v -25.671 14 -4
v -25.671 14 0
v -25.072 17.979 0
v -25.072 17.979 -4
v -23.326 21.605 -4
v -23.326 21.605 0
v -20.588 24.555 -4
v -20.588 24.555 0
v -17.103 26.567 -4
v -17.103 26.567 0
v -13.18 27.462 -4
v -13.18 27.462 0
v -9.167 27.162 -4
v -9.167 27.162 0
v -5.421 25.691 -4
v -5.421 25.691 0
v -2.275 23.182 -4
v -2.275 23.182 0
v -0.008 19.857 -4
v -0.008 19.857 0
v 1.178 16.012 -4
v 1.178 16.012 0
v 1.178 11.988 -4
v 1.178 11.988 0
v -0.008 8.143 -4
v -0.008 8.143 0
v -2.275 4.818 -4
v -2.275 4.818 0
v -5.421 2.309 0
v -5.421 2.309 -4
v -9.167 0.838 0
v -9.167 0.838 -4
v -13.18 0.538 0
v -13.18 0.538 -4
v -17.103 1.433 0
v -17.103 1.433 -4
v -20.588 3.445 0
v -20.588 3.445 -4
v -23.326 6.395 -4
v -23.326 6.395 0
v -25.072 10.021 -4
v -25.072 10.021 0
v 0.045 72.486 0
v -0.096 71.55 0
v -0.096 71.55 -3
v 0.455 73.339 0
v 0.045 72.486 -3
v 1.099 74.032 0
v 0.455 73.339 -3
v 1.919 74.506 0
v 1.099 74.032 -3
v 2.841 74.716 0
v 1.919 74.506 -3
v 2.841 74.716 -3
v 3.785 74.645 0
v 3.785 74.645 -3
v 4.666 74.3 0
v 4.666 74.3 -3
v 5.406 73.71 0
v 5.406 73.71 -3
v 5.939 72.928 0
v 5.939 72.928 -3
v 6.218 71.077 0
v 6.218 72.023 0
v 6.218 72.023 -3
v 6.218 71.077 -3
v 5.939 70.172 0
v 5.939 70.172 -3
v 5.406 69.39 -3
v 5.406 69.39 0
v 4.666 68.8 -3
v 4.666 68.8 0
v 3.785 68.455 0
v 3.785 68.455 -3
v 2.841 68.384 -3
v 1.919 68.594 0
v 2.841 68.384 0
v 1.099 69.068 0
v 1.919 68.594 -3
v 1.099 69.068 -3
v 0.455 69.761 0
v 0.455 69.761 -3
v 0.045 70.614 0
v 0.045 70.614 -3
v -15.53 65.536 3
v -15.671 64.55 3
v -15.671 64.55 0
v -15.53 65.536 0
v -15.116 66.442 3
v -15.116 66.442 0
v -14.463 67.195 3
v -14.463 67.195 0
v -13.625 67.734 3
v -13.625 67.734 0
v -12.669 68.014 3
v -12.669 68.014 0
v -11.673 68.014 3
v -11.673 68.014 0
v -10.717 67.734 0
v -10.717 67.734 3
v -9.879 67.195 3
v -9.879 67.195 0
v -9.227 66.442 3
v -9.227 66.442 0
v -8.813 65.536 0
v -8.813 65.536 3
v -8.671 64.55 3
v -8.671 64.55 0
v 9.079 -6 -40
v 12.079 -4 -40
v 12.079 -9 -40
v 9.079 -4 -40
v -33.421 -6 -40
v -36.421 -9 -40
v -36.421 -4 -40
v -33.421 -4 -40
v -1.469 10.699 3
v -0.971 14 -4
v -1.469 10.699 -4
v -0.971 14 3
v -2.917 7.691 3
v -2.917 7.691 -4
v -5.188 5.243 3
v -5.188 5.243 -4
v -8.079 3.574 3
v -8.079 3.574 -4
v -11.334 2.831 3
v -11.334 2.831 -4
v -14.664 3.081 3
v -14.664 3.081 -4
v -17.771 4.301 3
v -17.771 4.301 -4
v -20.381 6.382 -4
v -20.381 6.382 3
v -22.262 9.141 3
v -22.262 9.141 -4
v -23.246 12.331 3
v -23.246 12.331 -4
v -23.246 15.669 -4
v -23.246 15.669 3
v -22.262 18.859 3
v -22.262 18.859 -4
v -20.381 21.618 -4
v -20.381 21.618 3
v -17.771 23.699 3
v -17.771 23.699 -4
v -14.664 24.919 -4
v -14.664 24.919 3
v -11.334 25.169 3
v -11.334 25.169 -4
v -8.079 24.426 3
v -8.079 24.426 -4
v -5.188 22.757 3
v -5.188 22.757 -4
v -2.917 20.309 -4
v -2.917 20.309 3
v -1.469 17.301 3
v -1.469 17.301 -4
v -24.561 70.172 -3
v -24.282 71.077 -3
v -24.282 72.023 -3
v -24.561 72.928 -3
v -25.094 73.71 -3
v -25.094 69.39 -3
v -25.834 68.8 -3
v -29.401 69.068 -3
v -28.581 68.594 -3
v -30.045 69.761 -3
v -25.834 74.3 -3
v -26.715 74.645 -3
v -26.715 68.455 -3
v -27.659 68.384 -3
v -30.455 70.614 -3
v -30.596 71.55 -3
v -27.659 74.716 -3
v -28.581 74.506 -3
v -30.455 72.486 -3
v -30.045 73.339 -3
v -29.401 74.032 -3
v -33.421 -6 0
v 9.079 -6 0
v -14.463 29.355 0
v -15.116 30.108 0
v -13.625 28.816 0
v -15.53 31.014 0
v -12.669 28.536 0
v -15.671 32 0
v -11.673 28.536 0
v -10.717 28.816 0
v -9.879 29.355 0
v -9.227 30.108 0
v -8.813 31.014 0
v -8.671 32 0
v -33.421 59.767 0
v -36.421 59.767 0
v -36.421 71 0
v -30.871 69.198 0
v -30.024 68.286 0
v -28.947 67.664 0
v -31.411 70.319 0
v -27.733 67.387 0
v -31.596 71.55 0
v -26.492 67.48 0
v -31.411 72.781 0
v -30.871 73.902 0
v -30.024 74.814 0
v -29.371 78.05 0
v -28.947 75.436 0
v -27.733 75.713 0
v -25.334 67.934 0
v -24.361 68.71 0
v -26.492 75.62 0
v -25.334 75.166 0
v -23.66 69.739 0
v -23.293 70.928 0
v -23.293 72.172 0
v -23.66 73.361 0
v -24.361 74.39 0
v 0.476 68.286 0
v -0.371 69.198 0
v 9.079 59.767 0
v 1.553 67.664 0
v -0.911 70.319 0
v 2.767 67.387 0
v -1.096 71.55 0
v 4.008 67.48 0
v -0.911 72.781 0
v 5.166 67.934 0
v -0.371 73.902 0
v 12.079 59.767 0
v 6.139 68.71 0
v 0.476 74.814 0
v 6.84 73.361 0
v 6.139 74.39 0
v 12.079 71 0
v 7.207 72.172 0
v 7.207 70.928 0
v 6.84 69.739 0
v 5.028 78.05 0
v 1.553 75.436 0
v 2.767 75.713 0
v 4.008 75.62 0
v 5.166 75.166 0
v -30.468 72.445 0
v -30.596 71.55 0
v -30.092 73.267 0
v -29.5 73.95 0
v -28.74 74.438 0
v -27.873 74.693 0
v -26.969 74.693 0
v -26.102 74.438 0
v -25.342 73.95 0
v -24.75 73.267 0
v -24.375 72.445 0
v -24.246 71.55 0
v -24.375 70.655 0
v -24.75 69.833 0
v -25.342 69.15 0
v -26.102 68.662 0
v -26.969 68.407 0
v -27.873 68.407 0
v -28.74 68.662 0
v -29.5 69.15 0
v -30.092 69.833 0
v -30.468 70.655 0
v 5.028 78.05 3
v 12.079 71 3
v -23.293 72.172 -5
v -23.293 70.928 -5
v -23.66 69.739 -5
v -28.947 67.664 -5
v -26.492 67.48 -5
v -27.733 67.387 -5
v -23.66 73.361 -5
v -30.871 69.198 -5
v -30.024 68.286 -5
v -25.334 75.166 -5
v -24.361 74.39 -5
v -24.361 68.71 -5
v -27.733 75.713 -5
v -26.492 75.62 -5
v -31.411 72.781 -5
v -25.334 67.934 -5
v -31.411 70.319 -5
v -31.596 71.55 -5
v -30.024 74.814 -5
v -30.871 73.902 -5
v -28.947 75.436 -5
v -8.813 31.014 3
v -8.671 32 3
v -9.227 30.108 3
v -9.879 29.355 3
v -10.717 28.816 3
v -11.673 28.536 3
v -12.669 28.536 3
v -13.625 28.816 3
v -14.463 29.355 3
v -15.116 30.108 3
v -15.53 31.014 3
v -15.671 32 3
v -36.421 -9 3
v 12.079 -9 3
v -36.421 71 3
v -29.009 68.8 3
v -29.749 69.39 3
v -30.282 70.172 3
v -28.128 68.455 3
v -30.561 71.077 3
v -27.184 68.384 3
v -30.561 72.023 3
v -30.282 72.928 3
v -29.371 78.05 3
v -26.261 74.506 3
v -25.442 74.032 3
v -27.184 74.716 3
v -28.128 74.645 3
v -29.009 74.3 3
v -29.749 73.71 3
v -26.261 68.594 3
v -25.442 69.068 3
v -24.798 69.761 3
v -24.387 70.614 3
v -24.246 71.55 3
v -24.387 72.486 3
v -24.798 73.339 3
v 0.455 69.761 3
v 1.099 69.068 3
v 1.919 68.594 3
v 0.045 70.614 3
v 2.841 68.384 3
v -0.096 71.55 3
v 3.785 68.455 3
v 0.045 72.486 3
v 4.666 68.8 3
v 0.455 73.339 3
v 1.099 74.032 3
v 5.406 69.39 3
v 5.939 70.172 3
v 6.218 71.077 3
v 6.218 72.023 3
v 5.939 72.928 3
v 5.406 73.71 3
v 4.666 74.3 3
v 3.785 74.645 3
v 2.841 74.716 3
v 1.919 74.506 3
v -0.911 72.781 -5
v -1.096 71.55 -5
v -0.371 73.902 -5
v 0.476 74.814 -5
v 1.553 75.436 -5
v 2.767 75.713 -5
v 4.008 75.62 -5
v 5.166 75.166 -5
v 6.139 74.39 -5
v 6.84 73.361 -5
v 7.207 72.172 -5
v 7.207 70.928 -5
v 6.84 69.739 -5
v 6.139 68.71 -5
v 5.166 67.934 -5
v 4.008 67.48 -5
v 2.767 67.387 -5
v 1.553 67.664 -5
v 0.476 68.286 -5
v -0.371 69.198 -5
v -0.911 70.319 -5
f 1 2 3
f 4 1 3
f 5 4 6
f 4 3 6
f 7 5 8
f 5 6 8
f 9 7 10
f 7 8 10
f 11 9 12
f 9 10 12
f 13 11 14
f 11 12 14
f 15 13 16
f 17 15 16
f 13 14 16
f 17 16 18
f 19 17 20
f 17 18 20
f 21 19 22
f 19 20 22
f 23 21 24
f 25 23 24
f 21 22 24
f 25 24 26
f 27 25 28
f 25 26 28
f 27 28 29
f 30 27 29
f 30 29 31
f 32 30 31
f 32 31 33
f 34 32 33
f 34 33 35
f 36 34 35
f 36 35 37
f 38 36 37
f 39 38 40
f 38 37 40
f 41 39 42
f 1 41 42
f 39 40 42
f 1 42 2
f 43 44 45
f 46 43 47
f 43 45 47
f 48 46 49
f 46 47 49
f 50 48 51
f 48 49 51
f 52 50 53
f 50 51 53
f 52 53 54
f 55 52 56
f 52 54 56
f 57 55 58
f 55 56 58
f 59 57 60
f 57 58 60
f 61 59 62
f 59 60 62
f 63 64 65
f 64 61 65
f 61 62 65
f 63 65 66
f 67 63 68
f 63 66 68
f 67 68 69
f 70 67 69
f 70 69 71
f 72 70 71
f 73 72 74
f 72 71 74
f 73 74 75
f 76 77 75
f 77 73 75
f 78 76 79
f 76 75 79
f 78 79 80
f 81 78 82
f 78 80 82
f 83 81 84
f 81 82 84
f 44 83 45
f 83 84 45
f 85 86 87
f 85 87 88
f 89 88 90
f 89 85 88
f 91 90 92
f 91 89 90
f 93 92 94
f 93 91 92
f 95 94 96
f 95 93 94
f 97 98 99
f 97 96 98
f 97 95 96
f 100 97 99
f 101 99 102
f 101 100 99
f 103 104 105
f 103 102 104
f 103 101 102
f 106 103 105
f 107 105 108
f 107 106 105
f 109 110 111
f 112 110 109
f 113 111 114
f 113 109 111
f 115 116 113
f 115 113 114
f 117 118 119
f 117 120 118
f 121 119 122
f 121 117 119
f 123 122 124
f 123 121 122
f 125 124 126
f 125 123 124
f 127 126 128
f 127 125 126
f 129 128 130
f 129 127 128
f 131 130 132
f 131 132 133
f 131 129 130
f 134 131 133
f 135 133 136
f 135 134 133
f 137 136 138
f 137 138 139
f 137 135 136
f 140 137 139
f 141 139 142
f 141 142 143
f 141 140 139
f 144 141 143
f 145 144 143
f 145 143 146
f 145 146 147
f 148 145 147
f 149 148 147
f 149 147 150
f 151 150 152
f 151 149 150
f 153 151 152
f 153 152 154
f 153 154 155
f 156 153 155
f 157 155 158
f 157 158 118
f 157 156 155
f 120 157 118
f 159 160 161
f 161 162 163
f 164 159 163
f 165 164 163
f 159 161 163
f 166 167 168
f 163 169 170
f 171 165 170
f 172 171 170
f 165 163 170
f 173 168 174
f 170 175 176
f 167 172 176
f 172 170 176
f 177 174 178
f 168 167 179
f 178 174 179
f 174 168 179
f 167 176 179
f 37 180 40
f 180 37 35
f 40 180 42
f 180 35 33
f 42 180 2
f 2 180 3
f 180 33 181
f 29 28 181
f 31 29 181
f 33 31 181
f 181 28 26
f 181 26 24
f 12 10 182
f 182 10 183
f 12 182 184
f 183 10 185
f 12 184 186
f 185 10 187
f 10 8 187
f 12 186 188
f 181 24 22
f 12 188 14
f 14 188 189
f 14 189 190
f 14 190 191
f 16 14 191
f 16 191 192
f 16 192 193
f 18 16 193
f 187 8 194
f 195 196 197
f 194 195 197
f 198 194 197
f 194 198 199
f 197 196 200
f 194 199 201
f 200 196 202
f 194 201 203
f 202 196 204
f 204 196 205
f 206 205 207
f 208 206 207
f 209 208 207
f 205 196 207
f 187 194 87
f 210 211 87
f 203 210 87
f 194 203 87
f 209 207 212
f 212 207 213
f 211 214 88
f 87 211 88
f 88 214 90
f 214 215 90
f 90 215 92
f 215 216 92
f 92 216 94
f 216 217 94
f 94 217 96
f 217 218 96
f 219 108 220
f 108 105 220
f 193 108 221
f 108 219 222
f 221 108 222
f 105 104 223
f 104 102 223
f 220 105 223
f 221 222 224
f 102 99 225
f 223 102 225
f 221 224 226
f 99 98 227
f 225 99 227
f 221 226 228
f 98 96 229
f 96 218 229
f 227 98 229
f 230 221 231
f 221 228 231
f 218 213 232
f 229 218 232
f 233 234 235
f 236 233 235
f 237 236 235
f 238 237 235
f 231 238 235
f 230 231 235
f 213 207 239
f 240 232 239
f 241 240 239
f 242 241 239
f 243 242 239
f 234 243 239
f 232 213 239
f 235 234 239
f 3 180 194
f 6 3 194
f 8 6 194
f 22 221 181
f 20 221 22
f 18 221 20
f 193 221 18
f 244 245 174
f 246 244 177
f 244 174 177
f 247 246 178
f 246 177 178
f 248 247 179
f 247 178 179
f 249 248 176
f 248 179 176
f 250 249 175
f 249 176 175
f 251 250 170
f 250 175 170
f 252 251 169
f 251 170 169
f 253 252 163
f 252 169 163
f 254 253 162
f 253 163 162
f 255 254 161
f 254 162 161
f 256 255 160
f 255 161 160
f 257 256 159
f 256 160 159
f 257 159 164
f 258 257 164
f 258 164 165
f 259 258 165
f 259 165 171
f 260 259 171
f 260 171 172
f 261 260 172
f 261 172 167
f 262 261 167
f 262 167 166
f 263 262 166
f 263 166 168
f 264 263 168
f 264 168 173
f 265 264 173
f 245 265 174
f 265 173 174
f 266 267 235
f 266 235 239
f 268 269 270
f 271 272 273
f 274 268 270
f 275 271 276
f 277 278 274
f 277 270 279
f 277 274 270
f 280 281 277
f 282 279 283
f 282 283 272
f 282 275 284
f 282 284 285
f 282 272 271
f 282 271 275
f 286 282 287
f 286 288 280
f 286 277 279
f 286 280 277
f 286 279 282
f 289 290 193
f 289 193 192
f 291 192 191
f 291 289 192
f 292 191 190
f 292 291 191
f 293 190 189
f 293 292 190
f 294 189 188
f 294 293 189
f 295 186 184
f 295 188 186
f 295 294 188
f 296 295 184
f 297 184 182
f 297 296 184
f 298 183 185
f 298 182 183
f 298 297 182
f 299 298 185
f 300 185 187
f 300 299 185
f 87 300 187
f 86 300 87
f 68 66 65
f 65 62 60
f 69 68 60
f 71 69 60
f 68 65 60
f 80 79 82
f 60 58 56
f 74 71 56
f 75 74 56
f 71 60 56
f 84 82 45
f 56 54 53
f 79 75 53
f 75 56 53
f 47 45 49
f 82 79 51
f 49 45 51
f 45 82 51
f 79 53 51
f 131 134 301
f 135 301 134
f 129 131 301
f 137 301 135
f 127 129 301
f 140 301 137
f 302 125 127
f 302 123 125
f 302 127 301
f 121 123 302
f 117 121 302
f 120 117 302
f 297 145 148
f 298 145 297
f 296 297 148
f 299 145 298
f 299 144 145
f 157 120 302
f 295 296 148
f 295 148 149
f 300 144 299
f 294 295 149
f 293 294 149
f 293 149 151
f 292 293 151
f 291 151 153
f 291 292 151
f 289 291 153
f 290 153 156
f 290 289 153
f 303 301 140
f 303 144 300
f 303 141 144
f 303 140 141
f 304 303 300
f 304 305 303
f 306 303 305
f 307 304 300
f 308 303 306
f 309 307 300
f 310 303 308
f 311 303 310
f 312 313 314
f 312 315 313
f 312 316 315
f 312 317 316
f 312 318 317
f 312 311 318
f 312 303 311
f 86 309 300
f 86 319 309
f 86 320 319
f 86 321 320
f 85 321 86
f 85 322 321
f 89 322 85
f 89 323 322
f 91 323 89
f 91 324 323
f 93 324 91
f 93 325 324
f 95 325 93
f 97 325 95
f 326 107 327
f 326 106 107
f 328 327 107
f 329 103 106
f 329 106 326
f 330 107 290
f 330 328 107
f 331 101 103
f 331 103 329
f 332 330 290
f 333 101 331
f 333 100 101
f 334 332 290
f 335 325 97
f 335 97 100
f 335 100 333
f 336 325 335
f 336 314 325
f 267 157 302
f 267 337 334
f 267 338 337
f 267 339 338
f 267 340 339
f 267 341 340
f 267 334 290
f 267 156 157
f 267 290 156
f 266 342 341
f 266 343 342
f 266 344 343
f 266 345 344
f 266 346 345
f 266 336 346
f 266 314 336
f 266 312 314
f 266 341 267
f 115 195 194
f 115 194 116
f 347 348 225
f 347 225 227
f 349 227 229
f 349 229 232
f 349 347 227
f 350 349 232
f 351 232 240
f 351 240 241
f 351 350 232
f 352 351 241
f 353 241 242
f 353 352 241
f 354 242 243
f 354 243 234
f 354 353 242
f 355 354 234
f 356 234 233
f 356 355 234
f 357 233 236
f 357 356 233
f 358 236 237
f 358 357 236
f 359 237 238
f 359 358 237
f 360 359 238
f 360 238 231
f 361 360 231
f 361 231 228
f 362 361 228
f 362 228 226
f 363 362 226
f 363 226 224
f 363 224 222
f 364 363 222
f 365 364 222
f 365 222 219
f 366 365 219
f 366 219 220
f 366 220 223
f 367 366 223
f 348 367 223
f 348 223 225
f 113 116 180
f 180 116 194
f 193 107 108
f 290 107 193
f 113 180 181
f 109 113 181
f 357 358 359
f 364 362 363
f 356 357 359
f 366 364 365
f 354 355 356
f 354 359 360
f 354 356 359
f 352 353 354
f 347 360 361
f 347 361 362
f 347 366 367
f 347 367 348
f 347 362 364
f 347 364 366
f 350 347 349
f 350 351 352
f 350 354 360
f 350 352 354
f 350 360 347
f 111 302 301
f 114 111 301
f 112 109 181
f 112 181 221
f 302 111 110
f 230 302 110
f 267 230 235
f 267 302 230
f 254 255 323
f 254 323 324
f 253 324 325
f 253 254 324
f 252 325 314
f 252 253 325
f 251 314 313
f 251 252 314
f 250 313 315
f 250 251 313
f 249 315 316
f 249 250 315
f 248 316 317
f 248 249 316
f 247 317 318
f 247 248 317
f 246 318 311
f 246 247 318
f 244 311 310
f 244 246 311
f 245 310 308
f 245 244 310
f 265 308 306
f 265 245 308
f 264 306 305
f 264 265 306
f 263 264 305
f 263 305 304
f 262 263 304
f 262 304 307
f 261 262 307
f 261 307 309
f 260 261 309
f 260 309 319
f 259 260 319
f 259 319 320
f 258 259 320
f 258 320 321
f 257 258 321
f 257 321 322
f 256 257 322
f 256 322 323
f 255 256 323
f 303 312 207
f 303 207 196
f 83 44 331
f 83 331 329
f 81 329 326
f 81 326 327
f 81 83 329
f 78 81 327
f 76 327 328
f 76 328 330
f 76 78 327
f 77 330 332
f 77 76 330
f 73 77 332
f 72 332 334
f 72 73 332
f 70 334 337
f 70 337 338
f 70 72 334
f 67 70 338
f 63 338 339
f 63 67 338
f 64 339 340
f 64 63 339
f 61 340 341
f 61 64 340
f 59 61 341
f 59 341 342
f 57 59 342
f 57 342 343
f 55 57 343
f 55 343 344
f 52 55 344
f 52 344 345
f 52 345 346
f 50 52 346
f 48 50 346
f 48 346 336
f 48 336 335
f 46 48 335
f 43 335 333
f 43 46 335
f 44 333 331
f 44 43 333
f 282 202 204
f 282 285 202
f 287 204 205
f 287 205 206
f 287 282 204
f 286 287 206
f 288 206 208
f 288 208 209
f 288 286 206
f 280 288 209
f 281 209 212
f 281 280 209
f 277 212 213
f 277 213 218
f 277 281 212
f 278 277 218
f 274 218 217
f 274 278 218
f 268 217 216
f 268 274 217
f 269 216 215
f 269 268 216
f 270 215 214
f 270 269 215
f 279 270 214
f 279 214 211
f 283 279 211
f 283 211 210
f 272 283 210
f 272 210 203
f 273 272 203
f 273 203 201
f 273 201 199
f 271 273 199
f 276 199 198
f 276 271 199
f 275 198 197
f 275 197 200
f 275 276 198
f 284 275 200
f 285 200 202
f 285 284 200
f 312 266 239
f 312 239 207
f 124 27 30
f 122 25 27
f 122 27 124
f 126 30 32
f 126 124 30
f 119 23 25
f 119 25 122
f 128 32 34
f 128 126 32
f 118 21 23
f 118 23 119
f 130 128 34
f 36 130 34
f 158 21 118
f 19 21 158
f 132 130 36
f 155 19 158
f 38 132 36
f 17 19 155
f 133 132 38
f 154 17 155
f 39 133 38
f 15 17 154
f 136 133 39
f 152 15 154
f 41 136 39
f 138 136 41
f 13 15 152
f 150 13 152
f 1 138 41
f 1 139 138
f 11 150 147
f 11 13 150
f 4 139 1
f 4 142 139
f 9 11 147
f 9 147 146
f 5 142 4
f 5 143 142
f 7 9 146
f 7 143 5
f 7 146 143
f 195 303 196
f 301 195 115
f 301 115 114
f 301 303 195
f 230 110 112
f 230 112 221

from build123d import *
from OCP.BRepFilletAPI import BRepFilletAPI_MakeChamfer
from build123d.topology import SkipClean

# Parameters (mm, degrees)
SKETCH1_R                = 1.55
SKETCH1_R_2              = 1.5
SKETCH1_R_3              = 11
SKETCH1_R_4              = 3.175
BOSS_EXTRUDE1_DEPTH      = 3
BOSS_EXTRUDE2_START      = 3
SKETCH2_R                = 4.175
SKETCH2_R_2              = 3.175
BOSS_EXTRUDE2_DEPTH      = 3
BOSS_EXTRUDE3_START      = 2
SKETCH3_R                = 4.175
BOSS_EXTRUDE3_DEPTH      = 2
BOSS_EXTRUDE4_DEPTH      = 40
BOSS_EXTRUDE4_DEPTH_BACK = 3
SKETCH5_W                = 3
SKETCH5_H                = 5
BOSS_EXTRUDE5_DEPTH      = 3
BOSS_EXTRUDE7_DEPTH      = 3
BOSS_EXTRUDE9_DEPTH      = 3
BOSS_EXTRUDE10_START     = -3
SKETCH9_R                = 1.55
SKETCH9_R_2              = 1.5
SKETCH9_R_3              = 11
BOSS_EXTRUDE10_DEPTH     = 3
SKETCH10_R               = 11.2
CUT_EXTRUDE1_DEPTH       = 22.7
CUT_EXTRUDE2_DEPTH       = 10
SKETCH12_R               = 13.5
SKETCH12_R_2             = 11.2
BOSS_EXTRUDE11_DEPTH     = 4
SKETCH13_W               = 3
SKETCH13_H               = 76.55
BOSS_EXTRUDE13_DEPTH     = 3
BOSS_EXTRUDE14_DEPTH     = 3
BOSS_EXTRUDE15_DEPTH     = 3
SKETCH16_W               = 0.497079972
SKETCH16_H               = 40
CUT_EXTRUDE3_DEPTH       = 2
CHAMFER1_SIZE            = 3
CHAMFER1_SIZE_2          = 2.99439091
BOSS_EXTRUDE17_DEPTH     = 3


with BuildPart() as part:
    # Sketch1 → Boss-Extrude1 (new body)
    with BuildSketch(Plane.XY):
        Polygon((-33.421286346, -6), (-33.421286346, 36.5), (-33.421286346, 72.55), (-28.421286346, 77.55), (4.078713654, 77.55), (9.078713654, 72.55), (9.078713654, 36.5), (9.078713654, -6), align=None)
        with Locations((2.92772434, 30.5)):
            Circle(SKETCH1_R, mode=Mode.SUBTRACT)
        with Locations(Location((2.92772434, -0.5, 0), (0, 0, 180))):
            Circle(SKETCH1_R_2, mode=Mode.SUBTRACT)
        with Locations((-27.671286346, -0.5)):
            Circle(SKETCH1_R_2, mode=Mode.SUBTRACT)
        with Locations(Location((-28.07227566, 30.5, 0), (0, 0, 180))):
            Circle(SKETCH1_R_2, mode=Mode.SUBTRACT)
        with Locations((-12.171286346, 15.25)):
            Circle(SKETCH1_R_3, mode=Mode.SUBTRACT)
        with Locations((-27.421286346, 71.55)):
            Circle(SKETCH1_R_4, mode=Mode.SUBTRACT)
        with Locations(Location((3.078713654, 71.55, 0), (0, 0, 180))):
            Circle(SKETCH1_R_4, mode=Mode.SUBTRACT)
    extrude(amount=BOSS_EXTRUDE1_DEPTH)

    # Sketch2 → Boss-Extrude2 (add)
    # profile 1 of 2: a face of its own
    with SkipClean():  # the faces are left unmerged after this step: merging them gives an invalid solid
        with BuildSketch(Plane(origin=(0, 0, 0), x_dir=(-1, 0, 0), z_dir=(0, 0, -1)).offset(BOSS_EXTRUDE2_START)):
            with Locations((-3.078713654, 71.55)):
                Circle(SKETCH2_R)
            with Locations((-3.078713654, 71.55)):
                Circle(SKETCH2_R_2, mode=Mode.SUBTRACT)
        # profile 2 of 2: a face of its own
        with BuildSketch(Plane(origin=(0, 0, 0), x_dir=(-1, 0, 0), z_dir=(0, 0, -1)).offset(BOSS_EXTRUDE2_START)):
            with Locations((27.421286346, 71.55)):
                Circle(SKETCH2_R)
            with Locations((27.421286346, 71.55)):
                Circle(SKETCH2_R_2, mode=Mode.SUBTRACT)
        extrude(amount=-BOSS_EXTRUDE2_DEPTH)

    # Sketch3 → Boss-Extrude3 (add)
    with SkipClean():  # the faces are left unmerged after this step: merging them gives an invalid solid
        with BuildSketch(Plane(origin=(0, 0, -3), x_dir=(-1, 0, 0), z_dir=(0, 0, -1)).offset(BOSS_EXTRUDE3_START)):
            with Locations((-3.078713654, 71.55)):
                Circle(SKETCH3_R)
            with Locations((27.421286346, 71.55)):
                Circle(SKETCH3_R)
        extrude(amount=-BOSS_EXTRUDE3_DEPTH)

    # Sketch5 → Boss-Extrude5 (add)
    with SkipClean():  # the faces are left unmerged after this step: merging them gives an invalid solid
        with BuildSketch(Plane.XY.offset(3)):
            with Locations((10.578713654, 45.531399611)):
                Rectangle(SKETCH5_W, SKETCH5_H)
            with Locations((-34.921286346, 45.531399611)):
                Rectangle(SKETCH5_W, SKETCH5_H)
        extrude(amount=-BOSS_EXTRUDE5_DEPTH)



with BuildPart() as body_2:
    # Sketch4 → Boss-Extrude4 (new, two sides: drawn at the far end of the back side and taken through both)
    with BuildSketch(Plane(origin=(0, 0, 0), x_dir=(-1, 0, 0), z_dir=(0, 0, -1)).offset(-BOSS_EXTRUDE4_DEPTH_BACK)):
        Polygon((33.421286346, -6), (-9.078713654, -6), (-9.078713654, -4), (-12.078713654, -4), (-12.078713654, -9), (-9.078713654, -9), (33.259008686, -9), (36.259008686, -9), (36.259008686, -4), (33.259008686, -4), align=None)
    extrude(amount=BOSS_EXTRUDE4_DEPTH + BOSS_EXTRUDE4_DEPTH_BACK)


with BuildPart() as part_1:
    with SkipClean():  # the faces are left unmerged after this step: merging them gives an invalid solid
        add(part.part)

        add(body_2.part)  # Boss-Extrude7 merges body 2
        # Sketch6 → Boss-Extrude7 (add)
        with BuildSketch(Plane(origin=(9.078713654, 0, 0), x_dir=(0, 0, -1), z_dir=(1, 0, 0))):
            Polygon((0, 48.031399611), (40, -4), (36.156167209, -4), (0, 43.031399611), align=None)
        extrude(amount=BOSS_EXTRUDE7_DEPTH)

    # Sketch8 → Boss-Extrude9 (add)
    with BuildSketch(Plane.ZY.offset(36.421286346)):
        Polygon((0, 48.031399611), (0, 43.031399611), (-36.156167209, -4), (-40, -4), align=None)
    extrude(amount=-BOSS_EXTRUDE9_DEPTH)

    # Sketch9 → Boss-Extrude10 (add)
    with BuildSketch(Plane.XY.offset(3).offset(BOSS_EXTRUDE10_START)):
        with Locations((2.92772434, 30.5)):
            Circle(SKETCH9_R)
        with Locations((-28.07227566, 30.5)):
            Circle(SKETCH9_R_2)
        with Locations((-27.671286346, -0.5)):
            Circle(SKETCH9_R_2)
        with Locations((2.92772434, -0.5)):
            Circle(SKETCH9_R_2)
        with Locations((-12.171286346, 15.25)):
            Circle(SKETCH9_R_3)
    extrude(amount=BOSS_EXTRUDE10_DEPTH)

    # Sketch10 → Cut-Extrude1 (cut)
    with BuildSketch(Plane.XY.offset(3)):
        with Locations((-12.171286346, 14)):
            Circle(SKETCH10_R)
    extrude(amount=-CUT_EXTRUDE1_DEPTH, mode=Mode.SUBTRACT)

    # Sketch11 → Cut-Extrude2 (cut)
    with BuildSketch(Plane.XY.offset(3)):
        with BuildLine():
            Line((-8.671286346, 64.55), (-8.671286346, 32))
            ThreePointArc((-8.671286346, 32), (-12.171286346, 28.5), (-15.671286346, 32))
            Line((-15.671286346, 32), (-15.671286346, 64.55))
            ThreePointArc((-15.671286346, 64.55), (-12.171286346, 68.05), (-8.671286346, 64.55))
        make_face()
    extrude(amount=-CUT_EXTRUDE2_DEPTH, mode=Mode.SUBTRACT)

    # Sketch12 → Boss-Extrude11 (add)
    with BuildSketch(Plane(origin=(0, 0, 0), x_dir=(-1, 0, 0), z_dir=(0, 0, -1))):
        with Locations((12.171286346, 14)):
            Circle(SKETCH12_R)
        with Locations(Location((12.171286346, 14, 0), (0, 0, 180))):
            Circle(SKETCH12_R_2, mode=Mode.SUBTRACT)
    extrude(amount=BOSS_EXTRUDE11_DEPTH)

    # Sketch13 → Boss-Extrude13 (add)
    with BuildSketch(Plane.XY.offset(3)):
        with Locations((-34.921286346, 34.275)):
            Rectangle(SKETCH13_W, SKETCH13_H)
        Polygon((12.078713654, -4), (9.078713654, -4), (9.078713654, 72.55), (12.078713654, 72.555624881), align=None)
    extrude(amount=-BOSS_EXTRUDE13_DEPTH)

    # Sketch14 → Boss-Extrude14 (add)
    with BuildSketch(Plane(origin=(12.078713654, 0, 0), x_dir=(0, 0, -1), z_dir=(1, 0, 0))):
        Polygon((-3, 64.55), (-3, -9), (40, -9), (40, -4), align=None)
    extrude(amount=-BOSS_EXTRUDE14_DEPTH)

    # Sketch15 → Boss-Extrude15 (add)
    with BuildSketch(Plane.ZY.offset(36.421286346)):
        Polygon((3, 64.55), (-40, -4), (-40, -9), (3, -9), align=None)
    extrude(amount=-BOSS_EXTRUDE15_DEPTH)

    # Sketch16 → Cut-Extrude3 (cut)
    with BuildSketch(Plane(origin=(0, -4, 0), x_dir=(1, 0, 0), z_dir=(0, 1, 0))):
        with Locations((-33.17274636, 20)):
            Rectangle(SKETCH16_W, SKETCH16_H)
    extrude(amount=-CUT_EXTRUDE3_DEPTH, mode=Mode.SUBTRACT)

    # Chamfer1
    chamfer1_edges_1 = [part_1.edges().sort_by_distance(p)[0] for p in [
        (-36.421286346, 72.55, 1.5),
    ]]
    chamfer1_edges_2 = [part_1.edges().sort_by_distance(p)[0] for p in [
        (12.078713654, 72.555624881, 1.5),
    ]]
    chamfer1_side_2 = [part_1.faces().sort_by_distance(p)[0] for p in [
        (12.018825941, 72.555512593, 1.5),
    ]]
    chamfer1 = BRepFilletAPI_MakeChamfer(part_1.part.solid().wrapped)
    for e in chamfer1_edges_1:
        chamfer1.Add(CHAMFER1_SIZE - 0.0001, e.wrapped)
    for e in chamfer1_edges_2:
        chamfer1.Add(CHAMFER1_SIZE - 0.0001, CHAMFER1_SIZE_2 - 0.0001, e.wrapped, chamfer1_side_2[0].wrapped)
    add(Compound.cast(chamfer1.Shape()), mode=Mode.REPLACE)  # a hair under: the kernel refuses the full size

    # Sketch17 → Boss-Extrude17 (add)
    with BuildSketch(Plane.XY.offset(3)):
        Polygon((-33.421286346, 72.55), (-28.421286346, 77.55), (-12.171286346, 77.55), (-12.171286346, 78.05), (-29.370903561, 78.05), (-36.421286346, 70.999617215), (-36.421286346, 69.55), align=None)
        Polygon((-12.171286346, 78.05), (-12.171286346, 77.55), (4.078713654, 77.55), (9.078713654, 72.55), (12.078713654, 69.561233971), (12.078713654, 70.999617215), (5.028330869, 78.05), align=None)
    extrude(amount=-BOSS_EXTRUDE17_DEPTH)


solid = part_1.part
